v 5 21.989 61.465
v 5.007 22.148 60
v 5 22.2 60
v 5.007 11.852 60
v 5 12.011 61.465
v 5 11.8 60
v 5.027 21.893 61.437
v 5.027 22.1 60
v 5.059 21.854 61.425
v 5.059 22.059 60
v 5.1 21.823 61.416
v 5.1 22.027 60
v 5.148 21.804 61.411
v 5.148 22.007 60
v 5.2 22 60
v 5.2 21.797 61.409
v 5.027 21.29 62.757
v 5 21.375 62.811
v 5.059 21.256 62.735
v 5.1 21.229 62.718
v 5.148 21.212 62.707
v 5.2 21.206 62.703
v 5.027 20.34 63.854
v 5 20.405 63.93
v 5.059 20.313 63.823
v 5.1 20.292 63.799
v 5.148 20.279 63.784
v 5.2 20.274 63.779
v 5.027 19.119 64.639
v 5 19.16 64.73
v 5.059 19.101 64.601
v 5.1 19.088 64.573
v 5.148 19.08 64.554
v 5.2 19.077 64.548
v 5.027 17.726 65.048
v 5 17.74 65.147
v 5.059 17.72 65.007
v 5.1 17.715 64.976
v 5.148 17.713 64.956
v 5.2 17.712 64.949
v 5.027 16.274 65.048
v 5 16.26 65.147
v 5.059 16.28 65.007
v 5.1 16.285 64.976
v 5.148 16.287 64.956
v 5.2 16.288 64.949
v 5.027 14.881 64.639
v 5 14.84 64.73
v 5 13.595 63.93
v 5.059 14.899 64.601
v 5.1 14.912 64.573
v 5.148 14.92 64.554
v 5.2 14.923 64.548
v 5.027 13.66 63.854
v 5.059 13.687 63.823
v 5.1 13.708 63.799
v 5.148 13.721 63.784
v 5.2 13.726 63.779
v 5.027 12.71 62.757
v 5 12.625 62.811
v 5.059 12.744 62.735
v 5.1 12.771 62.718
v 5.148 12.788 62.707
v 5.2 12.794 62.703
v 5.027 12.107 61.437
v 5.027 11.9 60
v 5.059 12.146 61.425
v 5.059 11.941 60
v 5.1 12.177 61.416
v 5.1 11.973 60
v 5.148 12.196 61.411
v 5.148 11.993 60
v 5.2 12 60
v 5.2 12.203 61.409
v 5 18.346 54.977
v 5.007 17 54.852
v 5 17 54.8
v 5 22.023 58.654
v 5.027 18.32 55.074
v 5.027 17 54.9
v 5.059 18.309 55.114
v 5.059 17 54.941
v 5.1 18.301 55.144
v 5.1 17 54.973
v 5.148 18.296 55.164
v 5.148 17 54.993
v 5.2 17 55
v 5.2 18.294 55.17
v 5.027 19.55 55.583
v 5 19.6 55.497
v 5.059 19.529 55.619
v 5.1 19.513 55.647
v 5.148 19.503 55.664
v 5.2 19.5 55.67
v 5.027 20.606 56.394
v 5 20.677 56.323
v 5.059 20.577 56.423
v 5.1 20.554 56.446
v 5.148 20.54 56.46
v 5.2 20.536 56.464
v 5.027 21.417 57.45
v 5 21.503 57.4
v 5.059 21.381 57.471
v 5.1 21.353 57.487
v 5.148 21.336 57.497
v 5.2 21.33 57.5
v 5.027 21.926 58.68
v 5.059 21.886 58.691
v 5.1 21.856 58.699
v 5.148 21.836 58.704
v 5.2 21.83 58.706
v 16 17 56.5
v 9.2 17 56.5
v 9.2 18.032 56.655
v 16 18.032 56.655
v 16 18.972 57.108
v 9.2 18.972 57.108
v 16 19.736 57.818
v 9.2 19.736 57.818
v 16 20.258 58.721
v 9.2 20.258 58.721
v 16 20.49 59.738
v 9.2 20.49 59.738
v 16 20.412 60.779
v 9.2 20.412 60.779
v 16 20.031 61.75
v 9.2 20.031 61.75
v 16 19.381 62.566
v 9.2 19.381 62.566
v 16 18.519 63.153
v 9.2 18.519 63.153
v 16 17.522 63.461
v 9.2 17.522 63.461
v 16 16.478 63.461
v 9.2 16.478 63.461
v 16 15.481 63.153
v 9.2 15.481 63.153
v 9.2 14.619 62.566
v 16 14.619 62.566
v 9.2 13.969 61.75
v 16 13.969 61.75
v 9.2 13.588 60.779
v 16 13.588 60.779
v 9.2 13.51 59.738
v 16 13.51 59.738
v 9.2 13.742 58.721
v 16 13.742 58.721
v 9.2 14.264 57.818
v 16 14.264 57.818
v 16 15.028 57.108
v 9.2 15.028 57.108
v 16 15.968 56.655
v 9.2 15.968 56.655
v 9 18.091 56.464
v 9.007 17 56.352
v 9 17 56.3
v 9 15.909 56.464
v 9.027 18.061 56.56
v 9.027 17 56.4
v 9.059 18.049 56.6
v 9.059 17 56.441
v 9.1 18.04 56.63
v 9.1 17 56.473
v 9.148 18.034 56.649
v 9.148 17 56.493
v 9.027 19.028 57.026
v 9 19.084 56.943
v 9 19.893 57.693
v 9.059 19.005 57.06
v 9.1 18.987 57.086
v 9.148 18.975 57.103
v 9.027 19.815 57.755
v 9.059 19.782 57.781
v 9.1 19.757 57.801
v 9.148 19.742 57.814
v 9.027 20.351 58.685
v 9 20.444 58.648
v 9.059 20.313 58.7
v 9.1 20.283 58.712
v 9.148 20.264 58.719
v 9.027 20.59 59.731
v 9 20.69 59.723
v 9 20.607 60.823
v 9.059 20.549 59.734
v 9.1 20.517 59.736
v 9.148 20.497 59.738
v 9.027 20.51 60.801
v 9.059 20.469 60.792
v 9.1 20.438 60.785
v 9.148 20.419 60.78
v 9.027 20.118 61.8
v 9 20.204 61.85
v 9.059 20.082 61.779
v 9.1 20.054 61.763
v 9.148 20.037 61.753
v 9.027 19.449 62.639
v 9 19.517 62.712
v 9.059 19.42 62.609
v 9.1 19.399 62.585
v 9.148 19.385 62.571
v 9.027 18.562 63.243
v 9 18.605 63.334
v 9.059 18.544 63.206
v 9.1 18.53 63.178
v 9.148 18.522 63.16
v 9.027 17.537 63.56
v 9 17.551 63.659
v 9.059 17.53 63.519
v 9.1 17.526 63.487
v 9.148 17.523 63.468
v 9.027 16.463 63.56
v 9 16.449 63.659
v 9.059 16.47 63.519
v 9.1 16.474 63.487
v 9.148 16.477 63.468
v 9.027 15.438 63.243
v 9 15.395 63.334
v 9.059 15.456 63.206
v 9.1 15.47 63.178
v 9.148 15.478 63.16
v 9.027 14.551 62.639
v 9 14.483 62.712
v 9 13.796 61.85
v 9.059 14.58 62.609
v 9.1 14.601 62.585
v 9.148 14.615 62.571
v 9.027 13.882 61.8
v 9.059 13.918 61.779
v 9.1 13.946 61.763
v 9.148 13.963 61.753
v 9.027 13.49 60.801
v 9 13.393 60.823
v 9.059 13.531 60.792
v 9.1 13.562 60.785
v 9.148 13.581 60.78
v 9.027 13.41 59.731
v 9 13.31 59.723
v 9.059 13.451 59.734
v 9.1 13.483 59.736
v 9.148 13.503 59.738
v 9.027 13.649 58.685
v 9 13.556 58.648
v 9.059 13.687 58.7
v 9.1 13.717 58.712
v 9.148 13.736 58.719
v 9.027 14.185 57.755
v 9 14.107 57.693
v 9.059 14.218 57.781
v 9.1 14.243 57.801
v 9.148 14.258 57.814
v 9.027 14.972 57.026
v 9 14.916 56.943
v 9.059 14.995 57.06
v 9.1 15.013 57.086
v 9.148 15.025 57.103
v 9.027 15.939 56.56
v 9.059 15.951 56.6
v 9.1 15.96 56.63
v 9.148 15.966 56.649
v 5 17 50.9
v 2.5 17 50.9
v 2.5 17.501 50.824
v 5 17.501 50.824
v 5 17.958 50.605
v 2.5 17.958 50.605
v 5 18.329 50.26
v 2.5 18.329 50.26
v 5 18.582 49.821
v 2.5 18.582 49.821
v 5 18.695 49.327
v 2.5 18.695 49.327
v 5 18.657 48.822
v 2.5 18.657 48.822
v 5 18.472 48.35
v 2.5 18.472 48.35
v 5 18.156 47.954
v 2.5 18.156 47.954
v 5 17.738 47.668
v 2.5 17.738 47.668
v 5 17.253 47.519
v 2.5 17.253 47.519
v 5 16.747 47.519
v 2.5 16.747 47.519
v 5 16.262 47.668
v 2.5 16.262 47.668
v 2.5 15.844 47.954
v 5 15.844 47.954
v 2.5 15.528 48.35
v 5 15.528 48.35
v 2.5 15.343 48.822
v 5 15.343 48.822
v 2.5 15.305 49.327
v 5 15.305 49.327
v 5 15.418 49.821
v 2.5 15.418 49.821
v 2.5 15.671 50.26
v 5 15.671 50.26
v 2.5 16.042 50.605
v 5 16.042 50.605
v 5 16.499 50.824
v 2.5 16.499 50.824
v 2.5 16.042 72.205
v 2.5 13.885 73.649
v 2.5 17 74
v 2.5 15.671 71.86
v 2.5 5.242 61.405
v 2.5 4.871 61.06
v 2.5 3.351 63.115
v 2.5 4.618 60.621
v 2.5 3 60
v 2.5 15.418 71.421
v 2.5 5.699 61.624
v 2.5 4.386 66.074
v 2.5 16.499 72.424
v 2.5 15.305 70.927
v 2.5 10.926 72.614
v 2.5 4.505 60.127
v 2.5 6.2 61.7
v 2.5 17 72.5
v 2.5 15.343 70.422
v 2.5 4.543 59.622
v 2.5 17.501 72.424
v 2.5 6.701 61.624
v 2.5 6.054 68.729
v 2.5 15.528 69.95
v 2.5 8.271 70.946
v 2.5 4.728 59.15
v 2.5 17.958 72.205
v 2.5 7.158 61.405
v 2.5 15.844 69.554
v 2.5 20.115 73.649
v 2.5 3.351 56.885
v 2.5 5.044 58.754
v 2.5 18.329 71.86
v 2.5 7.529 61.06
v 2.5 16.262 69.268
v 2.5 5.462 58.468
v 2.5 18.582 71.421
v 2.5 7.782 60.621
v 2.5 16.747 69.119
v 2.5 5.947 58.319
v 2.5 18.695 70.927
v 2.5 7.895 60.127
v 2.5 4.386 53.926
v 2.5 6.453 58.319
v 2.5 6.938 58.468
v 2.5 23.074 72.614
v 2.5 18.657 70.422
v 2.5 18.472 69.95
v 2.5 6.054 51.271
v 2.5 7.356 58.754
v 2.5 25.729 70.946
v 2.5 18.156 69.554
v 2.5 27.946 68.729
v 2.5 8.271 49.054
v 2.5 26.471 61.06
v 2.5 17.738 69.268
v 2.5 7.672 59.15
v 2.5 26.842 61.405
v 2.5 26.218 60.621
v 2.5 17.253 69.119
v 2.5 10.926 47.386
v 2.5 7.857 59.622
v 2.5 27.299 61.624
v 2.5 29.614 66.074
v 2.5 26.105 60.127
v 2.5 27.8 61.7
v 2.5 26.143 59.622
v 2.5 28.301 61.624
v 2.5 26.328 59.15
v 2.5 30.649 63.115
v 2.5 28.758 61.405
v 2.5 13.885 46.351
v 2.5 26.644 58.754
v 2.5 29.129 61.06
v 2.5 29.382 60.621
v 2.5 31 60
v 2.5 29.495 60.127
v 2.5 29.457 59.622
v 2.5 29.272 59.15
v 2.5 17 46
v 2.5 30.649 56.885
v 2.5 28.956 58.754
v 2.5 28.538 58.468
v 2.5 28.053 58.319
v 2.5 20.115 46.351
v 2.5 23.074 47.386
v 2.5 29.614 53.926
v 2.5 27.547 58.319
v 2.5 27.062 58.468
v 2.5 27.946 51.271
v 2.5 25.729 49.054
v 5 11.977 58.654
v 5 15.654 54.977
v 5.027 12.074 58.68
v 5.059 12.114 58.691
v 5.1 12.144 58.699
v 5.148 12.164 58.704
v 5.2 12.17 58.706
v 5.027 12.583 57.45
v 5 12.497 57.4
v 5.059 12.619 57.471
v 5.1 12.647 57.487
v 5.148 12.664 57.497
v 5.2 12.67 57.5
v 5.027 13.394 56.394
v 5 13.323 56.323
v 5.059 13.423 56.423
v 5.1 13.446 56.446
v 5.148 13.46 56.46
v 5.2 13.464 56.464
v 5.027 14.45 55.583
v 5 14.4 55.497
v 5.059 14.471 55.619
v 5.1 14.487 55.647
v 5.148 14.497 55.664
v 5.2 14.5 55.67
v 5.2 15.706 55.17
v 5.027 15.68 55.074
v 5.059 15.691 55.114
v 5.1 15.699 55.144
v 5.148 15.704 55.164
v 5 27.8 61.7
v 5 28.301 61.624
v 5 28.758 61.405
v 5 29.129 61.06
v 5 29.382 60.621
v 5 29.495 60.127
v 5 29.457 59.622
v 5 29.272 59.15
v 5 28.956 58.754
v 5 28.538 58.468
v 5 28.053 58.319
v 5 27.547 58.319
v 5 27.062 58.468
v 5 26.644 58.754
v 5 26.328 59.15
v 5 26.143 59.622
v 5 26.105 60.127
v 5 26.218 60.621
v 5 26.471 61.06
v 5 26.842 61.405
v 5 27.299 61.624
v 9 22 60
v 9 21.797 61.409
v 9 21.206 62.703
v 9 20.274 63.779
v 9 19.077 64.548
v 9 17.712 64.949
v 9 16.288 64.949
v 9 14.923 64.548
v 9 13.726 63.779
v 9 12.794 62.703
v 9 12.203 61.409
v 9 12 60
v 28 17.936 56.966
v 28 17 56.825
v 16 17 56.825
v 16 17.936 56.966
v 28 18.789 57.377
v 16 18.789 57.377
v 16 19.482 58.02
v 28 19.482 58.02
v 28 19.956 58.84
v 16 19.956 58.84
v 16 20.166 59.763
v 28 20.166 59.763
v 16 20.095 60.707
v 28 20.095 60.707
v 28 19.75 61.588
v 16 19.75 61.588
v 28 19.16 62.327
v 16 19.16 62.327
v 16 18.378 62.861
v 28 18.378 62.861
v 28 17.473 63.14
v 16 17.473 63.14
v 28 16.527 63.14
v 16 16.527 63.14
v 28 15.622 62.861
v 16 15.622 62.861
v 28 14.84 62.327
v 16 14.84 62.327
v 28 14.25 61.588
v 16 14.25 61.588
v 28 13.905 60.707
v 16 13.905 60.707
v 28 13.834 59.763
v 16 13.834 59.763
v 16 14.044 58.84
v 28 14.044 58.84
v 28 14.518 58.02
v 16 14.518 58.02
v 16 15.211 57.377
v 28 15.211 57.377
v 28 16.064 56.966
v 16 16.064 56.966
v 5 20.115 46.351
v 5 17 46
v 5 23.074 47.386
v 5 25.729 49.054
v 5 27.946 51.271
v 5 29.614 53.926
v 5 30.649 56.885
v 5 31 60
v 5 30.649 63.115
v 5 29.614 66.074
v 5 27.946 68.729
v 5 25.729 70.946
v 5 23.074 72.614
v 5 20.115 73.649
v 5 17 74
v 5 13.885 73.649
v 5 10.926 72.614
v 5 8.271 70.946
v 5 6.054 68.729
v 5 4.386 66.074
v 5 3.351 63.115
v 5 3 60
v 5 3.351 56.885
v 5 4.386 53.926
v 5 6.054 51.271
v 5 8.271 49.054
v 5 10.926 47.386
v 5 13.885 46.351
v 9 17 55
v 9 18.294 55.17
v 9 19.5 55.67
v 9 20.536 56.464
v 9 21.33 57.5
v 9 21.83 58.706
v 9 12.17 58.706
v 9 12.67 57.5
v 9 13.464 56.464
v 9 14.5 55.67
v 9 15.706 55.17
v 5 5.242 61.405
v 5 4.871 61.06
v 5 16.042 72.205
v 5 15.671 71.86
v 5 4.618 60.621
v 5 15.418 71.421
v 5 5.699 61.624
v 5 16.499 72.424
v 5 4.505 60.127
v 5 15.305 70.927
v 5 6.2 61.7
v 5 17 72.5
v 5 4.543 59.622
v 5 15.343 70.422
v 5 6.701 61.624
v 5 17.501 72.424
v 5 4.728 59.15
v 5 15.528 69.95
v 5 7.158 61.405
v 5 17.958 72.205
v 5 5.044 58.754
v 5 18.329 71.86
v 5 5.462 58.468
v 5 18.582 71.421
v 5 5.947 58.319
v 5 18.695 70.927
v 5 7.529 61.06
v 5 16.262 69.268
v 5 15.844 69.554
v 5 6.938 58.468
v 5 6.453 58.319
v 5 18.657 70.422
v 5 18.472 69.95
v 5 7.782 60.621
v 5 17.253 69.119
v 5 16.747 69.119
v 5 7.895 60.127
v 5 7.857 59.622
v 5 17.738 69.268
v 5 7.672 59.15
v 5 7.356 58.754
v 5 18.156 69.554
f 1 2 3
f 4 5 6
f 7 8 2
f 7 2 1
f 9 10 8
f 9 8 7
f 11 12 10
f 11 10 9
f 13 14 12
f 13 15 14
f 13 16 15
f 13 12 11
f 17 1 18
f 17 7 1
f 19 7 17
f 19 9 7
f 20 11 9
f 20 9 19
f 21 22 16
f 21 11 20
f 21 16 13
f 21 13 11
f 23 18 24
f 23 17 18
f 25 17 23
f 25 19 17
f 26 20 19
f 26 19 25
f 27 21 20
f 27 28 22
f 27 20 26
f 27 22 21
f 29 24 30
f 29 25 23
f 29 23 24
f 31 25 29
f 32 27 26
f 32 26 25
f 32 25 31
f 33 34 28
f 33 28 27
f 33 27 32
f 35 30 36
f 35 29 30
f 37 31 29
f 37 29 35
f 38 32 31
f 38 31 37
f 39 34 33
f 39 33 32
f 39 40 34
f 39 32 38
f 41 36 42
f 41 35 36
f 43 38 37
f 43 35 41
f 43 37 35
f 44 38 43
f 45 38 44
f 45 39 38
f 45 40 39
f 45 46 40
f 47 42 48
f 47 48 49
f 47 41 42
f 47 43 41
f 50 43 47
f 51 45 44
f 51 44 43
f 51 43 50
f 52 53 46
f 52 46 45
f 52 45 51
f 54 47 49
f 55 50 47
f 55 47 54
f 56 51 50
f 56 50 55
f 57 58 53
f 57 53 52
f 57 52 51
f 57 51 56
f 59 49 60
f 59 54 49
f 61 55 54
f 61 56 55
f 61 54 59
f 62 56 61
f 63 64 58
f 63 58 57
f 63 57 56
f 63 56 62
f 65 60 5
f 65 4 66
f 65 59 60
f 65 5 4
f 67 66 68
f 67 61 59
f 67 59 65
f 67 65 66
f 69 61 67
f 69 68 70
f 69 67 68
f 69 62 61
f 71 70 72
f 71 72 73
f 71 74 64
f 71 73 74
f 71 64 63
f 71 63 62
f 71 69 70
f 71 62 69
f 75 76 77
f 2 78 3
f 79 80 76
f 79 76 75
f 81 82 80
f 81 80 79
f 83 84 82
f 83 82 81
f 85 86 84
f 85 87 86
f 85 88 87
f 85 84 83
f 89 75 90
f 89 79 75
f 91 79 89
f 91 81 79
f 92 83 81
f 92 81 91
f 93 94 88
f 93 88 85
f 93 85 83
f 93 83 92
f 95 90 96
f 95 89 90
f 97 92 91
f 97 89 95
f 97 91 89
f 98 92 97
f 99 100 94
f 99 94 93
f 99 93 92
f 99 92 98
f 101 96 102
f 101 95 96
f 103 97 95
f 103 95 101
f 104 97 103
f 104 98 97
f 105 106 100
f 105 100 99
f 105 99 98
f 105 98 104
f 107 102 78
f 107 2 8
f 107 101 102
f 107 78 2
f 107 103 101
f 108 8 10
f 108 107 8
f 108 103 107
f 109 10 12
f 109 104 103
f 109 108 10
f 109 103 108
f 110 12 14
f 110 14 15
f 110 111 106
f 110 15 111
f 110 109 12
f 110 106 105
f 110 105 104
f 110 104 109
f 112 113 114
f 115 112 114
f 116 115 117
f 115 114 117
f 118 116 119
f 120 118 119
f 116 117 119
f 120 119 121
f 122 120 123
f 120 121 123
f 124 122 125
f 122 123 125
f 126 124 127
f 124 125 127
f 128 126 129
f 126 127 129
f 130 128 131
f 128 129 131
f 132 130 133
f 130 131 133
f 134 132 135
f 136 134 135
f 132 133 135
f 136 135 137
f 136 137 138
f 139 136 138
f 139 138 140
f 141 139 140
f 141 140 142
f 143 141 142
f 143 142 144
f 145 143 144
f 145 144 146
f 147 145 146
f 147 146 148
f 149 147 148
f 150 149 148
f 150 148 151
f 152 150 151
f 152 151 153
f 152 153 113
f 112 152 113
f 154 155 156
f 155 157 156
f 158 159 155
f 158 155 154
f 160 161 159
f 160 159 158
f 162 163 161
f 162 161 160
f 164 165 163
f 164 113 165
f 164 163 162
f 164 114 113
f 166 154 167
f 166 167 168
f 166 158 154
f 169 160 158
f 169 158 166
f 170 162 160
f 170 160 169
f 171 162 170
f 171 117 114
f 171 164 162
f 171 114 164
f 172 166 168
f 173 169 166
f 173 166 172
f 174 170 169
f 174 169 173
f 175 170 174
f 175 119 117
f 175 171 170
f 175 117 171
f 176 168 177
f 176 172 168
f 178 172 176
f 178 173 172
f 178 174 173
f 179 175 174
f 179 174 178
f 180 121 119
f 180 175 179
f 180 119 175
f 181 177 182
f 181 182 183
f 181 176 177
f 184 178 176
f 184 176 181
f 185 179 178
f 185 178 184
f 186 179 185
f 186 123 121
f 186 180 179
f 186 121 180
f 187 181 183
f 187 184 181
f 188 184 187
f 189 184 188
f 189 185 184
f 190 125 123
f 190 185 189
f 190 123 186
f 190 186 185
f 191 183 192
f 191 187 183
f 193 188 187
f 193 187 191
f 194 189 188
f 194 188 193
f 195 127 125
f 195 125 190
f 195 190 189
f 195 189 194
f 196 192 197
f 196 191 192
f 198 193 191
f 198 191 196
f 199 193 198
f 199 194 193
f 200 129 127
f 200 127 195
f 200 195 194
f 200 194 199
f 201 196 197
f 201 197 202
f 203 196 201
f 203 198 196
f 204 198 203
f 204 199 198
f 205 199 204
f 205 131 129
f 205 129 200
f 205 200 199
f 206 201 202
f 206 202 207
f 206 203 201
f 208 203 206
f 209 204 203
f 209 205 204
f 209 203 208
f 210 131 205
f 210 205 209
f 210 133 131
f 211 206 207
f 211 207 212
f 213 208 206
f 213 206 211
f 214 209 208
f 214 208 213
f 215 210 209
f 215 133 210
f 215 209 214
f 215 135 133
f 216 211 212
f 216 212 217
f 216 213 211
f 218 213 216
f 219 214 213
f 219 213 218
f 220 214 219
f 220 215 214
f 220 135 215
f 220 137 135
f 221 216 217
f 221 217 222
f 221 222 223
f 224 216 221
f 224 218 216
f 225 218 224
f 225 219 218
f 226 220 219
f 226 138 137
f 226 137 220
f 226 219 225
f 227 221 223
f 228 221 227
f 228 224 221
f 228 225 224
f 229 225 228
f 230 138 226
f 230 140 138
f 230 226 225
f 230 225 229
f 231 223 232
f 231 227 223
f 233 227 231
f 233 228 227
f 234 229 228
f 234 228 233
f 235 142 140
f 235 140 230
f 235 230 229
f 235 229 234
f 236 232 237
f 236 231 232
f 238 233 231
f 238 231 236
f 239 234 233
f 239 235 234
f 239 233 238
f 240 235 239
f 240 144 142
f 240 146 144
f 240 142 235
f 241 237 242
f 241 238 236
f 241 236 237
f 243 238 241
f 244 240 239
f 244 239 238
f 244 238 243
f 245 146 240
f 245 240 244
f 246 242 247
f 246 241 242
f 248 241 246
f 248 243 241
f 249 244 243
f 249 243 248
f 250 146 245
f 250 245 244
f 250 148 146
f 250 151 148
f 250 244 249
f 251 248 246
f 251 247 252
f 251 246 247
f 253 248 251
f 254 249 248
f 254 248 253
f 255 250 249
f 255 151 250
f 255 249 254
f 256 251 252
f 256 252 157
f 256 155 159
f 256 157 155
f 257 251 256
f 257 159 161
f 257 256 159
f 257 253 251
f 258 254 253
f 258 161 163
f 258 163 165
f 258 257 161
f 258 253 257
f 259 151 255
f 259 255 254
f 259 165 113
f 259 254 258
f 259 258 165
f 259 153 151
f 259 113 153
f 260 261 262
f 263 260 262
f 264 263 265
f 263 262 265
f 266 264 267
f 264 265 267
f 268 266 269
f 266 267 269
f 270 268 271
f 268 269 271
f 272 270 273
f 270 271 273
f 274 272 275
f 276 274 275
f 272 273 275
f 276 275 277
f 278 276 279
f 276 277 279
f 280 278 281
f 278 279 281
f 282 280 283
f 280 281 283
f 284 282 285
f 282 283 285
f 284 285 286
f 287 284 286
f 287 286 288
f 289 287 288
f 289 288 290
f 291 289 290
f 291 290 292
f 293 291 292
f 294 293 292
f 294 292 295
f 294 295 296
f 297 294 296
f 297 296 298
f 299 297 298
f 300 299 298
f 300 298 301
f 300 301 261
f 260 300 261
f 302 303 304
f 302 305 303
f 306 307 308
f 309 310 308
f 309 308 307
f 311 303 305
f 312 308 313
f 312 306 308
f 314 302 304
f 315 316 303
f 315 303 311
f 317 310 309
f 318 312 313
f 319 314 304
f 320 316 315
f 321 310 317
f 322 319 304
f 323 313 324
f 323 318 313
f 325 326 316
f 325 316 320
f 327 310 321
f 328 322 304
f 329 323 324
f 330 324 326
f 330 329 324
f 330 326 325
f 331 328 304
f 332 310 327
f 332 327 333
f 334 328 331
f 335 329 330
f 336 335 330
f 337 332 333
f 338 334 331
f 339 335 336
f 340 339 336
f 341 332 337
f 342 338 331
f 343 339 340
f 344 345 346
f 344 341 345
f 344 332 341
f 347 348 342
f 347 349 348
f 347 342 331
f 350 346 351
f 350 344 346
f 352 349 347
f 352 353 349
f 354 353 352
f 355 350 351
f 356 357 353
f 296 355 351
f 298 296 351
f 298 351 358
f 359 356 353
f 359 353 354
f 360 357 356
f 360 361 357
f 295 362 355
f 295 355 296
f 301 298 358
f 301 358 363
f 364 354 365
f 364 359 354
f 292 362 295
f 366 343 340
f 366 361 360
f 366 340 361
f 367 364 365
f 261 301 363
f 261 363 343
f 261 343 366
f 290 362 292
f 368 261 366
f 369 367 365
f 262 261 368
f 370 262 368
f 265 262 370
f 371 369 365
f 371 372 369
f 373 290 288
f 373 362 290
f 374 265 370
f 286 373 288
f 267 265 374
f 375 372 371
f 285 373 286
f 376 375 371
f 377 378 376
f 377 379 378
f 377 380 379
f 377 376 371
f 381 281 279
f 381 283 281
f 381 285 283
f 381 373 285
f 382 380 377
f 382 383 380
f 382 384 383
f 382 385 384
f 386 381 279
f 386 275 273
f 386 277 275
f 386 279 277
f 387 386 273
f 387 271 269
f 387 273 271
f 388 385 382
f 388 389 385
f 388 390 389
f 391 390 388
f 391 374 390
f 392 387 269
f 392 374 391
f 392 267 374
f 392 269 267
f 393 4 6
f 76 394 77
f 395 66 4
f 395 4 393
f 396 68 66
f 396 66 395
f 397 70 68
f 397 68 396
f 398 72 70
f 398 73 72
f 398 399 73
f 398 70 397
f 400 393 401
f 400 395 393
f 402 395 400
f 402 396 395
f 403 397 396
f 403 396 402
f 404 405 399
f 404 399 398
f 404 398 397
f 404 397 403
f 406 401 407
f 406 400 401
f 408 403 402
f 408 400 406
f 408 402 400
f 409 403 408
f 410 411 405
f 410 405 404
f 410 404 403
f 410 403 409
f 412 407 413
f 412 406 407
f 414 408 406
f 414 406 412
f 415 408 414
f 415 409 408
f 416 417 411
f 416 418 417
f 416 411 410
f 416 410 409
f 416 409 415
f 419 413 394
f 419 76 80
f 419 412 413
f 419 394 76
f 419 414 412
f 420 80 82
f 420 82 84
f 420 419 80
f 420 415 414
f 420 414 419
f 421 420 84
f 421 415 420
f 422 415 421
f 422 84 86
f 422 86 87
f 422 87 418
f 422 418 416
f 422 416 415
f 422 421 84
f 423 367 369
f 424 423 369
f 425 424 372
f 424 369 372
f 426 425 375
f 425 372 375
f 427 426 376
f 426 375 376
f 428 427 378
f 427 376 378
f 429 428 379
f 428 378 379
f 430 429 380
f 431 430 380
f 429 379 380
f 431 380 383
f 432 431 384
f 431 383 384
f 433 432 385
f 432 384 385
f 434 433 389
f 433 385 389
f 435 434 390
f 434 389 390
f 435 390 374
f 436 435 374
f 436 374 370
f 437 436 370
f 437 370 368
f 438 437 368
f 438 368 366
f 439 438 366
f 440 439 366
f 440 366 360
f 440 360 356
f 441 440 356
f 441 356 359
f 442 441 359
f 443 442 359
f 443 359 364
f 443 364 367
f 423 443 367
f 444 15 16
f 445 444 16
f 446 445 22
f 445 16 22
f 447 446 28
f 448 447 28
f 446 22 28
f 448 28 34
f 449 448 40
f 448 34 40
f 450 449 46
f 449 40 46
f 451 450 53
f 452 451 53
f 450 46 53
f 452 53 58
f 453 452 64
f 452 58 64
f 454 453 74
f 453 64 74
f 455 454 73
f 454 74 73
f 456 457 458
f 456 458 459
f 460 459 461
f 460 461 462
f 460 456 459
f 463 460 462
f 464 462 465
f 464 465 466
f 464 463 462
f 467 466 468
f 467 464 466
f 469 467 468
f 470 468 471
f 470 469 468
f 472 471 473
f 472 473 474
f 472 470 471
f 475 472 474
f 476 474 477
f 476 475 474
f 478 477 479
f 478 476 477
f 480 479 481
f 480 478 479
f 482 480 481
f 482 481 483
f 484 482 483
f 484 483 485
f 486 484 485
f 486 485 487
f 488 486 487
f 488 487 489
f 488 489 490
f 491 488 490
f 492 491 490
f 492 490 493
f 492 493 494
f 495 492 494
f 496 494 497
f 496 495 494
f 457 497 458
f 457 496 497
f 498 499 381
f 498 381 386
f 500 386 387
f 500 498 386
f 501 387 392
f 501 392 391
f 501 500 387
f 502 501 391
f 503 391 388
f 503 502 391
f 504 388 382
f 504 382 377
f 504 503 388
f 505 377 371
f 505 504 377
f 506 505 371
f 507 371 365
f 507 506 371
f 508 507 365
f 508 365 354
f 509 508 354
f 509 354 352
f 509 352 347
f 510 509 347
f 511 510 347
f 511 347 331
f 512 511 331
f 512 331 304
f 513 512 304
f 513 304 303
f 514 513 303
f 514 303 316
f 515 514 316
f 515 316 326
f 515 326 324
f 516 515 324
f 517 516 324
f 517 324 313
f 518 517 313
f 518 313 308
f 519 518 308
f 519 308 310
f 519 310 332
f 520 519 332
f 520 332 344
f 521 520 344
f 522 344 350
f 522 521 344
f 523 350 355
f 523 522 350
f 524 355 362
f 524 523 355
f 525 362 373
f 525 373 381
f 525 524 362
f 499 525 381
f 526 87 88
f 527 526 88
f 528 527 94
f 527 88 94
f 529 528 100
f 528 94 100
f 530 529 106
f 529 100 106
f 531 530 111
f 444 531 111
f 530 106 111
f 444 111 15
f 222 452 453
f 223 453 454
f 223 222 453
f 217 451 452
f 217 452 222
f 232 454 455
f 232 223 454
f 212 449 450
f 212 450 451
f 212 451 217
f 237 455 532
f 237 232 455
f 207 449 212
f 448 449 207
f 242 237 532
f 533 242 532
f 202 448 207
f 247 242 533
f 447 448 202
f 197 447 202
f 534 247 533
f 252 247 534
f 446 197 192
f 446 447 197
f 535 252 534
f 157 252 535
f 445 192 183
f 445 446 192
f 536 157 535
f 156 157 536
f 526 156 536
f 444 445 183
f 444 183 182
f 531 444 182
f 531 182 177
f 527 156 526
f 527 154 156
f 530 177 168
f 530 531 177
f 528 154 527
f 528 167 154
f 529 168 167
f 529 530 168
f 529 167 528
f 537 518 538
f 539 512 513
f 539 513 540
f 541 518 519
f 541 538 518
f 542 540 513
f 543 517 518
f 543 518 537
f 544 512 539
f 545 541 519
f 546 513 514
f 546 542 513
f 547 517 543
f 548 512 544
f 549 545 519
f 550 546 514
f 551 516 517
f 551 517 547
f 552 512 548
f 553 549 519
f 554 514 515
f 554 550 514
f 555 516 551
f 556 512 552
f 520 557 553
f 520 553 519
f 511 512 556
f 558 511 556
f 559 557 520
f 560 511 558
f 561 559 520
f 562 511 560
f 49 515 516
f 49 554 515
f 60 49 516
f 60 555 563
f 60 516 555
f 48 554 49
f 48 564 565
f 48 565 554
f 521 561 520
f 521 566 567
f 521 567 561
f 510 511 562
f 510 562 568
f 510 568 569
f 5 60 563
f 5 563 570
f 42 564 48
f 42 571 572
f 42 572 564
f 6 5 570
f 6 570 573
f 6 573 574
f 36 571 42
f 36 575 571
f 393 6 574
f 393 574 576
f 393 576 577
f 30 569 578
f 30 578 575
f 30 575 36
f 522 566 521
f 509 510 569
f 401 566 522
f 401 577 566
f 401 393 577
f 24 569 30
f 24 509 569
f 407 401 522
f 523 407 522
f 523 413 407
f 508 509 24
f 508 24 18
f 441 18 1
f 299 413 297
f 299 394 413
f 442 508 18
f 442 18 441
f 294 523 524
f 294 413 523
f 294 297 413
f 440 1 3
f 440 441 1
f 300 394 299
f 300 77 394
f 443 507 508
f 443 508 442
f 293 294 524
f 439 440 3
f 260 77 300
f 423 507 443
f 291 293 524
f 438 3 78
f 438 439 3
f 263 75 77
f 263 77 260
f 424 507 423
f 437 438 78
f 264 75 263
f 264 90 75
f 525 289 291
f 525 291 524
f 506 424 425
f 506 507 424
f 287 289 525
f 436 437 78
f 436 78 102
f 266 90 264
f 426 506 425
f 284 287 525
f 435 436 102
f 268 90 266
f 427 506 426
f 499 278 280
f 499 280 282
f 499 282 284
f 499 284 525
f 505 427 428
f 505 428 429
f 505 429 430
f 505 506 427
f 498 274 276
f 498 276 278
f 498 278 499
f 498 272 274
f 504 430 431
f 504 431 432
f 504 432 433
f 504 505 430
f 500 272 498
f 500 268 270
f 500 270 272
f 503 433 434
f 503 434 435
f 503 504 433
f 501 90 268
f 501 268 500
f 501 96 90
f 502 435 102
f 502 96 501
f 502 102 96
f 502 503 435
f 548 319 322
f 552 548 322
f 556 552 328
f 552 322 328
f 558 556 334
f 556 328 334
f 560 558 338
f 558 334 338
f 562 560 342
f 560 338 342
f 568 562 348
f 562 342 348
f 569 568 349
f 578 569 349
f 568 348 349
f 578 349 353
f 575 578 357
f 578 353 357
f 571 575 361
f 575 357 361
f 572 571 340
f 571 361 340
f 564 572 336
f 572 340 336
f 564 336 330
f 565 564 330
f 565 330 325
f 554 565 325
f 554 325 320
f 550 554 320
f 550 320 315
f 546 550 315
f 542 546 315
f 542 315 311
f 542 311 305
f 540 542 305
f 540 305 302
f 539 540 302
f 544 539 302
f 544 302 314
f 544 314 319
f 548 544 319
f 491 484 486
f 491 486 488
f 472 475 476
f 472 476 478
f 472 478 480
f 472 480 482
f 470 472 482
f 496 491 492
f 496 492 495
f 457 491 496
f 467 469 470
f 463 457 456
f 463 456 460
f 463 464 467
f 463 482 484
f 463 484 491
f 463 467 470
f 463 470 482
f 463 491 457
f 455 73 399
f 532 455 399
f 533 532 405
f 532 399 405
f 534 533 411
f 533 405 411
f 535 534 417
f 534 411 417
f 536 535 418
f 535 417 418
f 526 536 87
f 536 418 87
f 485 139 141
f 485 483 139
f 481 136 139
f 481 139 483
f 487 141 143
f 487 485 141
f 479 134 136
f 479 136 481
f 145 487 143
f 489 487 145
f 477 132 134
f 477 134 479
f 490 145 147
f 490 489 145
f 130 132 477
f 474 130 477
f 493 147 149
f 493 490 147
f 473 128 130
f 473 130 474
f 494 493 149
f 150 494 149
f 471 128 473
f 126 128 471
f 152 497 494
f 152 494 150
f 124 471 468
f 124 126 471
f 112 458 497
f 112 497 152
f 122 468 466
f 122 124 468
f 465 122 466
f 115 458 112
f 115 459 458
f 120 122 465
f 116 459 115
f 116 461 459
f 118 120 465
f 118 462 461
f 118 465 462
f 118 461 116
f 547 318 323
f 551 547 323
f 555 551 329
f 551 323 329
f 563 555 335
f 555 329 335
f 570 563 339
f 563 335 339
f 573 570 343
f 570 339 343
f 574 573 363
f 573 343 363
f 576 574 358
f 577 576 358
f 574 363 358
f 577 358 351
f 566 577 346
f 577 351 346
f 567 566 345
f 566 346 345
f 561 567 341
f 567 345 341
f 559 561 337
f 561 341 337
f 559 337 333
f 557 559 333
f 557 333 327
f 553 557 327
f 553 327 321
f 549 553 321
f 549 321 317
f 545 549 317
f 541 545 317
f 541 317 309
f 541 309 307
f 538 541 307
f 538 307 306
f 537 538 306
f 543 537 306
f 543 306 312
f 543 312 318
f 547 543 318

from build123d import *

# Parameters (mm, degrees)
SKETCH1_W                = 120
SKETCH1_H                = 34
BOSS_EXTRUDE1_DEPTH      = 5
BOSS_EXTRUDE2_DEPTH      = 4
SKETCH3_R                = 3.5
BOSS_EXTRUDE3_DEPTH      = 19
SKETCH4_R                = 3.5
SKETCH4_R_2              = 3.175
CUT_EXTRUDE1_DEPTH       = 12
FILLET1_R                = 0.2
SKETCH5_W                = 120
SKETCH5_H                = 34
SKETCH5_R                = 14
CUT_EXTRUDE2_DEPTH       = 6
M3_CLEARANCE_HOLE1_D     = 3.4
M3_CLEARANCE_HOLE1_DEPTH = 15
M3_CLEARANCE_HOLE1_TIP   = 1.021463052
SKETCH9_W                = 2.5
SKETCH9_H                = 28
CUT_EXTRUDE6_DEPTH       = 29


with BuildPart() as part:
    # Sketch1 → Boss-Extrude1 (new body)
    with BuildSketch(Plane(origin=(0, 0, 0), x_dir=(0, 0, -1), z_dir=(1, 0, 0))):
        with Locations((-60, 17)):
            Rectangle(SKETCH1_W, SKETCH1_H)
    extrude(amount=BOSS_EXTRUDE1_DEPTH)

    # Sketch2 → Boss-Extrude2 (add)
    with BuildSketch(Plane(origin=(5, 0, 0), x_dir=(0, 0, -1), z_dir=(1, 0, 0))):
        with BuildLine():
            ThreePointArc((-55, 17), (-56.464466094, 20.535533906), (-60, 22))
            Line((-60, 22), (-60, 12))
            ThreePointArc((-60, 12), (-56.464466094, 13.464466094), (-55, 17))
        make_face()
        with BuildLine():
            Line((-60, 12), (-60, 22))
            ThreePointArc((-60, 22), (-65, 17), (-60, 12))
        make_face()
    extrude(amount=BOSS_EXTRUDE2_DEPTH)

    # Sketch3 → Boss-Extrude3 (add)
    with BuildSketch(Plane(origin=(9, 0, 0), x_dir=(0, 0, -1), z_dir=(1, 0, 0))):
        with Locations((-60, 17)):
            Circle(SKETCH3_R)
    extrude(amount=BOSS_EXTRUDE3_DEPTH)

    # Sketch4 → Cut-Extrude1 (cut)
    with BuildSketch(Plane(origin=(28, 0, 0), x_dir=(0, 0, -1), z_dir=(1, 0, 0))):
        with Locations((-60, 17)):
            Circle(SKETCH4_R)
        with Locations((-60, 17)):
            Circle(SKETCH4_R_2, mode=Mode.SUBTRACT)
    extrude(amount=-CUT_EXTRUDE1_DEPTH, mode=Mode.SUBTRACT)

    # Fillet1
    fillet1_edges = [part.edges().sort_by_distance(p)[0] for p in [
        (5, 12, 60),
        (9, 17, 63.5),
    ]]
    fillet(fillet1_edges, radius=FILLET1_R)

    # Sketch5 → Cut-Extrude2 (cut, through all)
    with BuildSketch(Plane(origin=(5, 0, 0), x_dir=(0, 0, -1), z_dir=(1, 0, 0))):
        with Locations((-60, 17)):
            Rectangle(SKETCH5_W, SKETCH5_H)
        with Locations((-60, 17)):
            Circle(SKETCH5_R, mode=Mode.SUBTRACT)
    extrude(amount=-CUT_EXTRUDE2_DEPTH, mode=Mode.SUBTRACT)

    # M3 Clearance Hole1
    with Locations(Plane(origin=(5, 0, 0), x_dir=(0, 0, -1), z_dir=(1, 0, 0))):
        with Locations((-60, 27.8), (-49.2, 17), (-60, 6.2), (-70.8, 17)):
            Hole(M3_CLEARANCE_HOLE1_D / 2, depth=M3_CLEARANCE_HOLE1_DEPTH)
            with Locations((0, 0, -(M3_CLEARANCE_HOLE1_DEPTH + M3_CLEARANCE_HOLE1_TIP / 2))):  # 118° drill point
                Cone(0, M3_CLEARANCE_HOLE1_D / 2, M3_CLEARANCE_HOLE1_TIP, mode=Mode.SUBTRACT)

    # Sketch9 → Cut-Extrude6 (cut, through all)
    with BuildSketch(Plane(origin=(0, 0, 46), x_dir=(-1, 0, 0), z_dir=(0, 0, -1))):
        with Locations((-1.25, 17)):
            Rectangle(SKETCH9_W, SKETCH9_H)
    extrude(amount=-CUT_EXTRUDE6_DEPTH, mode=Mode.SUBTRACT)


solid = part.part
